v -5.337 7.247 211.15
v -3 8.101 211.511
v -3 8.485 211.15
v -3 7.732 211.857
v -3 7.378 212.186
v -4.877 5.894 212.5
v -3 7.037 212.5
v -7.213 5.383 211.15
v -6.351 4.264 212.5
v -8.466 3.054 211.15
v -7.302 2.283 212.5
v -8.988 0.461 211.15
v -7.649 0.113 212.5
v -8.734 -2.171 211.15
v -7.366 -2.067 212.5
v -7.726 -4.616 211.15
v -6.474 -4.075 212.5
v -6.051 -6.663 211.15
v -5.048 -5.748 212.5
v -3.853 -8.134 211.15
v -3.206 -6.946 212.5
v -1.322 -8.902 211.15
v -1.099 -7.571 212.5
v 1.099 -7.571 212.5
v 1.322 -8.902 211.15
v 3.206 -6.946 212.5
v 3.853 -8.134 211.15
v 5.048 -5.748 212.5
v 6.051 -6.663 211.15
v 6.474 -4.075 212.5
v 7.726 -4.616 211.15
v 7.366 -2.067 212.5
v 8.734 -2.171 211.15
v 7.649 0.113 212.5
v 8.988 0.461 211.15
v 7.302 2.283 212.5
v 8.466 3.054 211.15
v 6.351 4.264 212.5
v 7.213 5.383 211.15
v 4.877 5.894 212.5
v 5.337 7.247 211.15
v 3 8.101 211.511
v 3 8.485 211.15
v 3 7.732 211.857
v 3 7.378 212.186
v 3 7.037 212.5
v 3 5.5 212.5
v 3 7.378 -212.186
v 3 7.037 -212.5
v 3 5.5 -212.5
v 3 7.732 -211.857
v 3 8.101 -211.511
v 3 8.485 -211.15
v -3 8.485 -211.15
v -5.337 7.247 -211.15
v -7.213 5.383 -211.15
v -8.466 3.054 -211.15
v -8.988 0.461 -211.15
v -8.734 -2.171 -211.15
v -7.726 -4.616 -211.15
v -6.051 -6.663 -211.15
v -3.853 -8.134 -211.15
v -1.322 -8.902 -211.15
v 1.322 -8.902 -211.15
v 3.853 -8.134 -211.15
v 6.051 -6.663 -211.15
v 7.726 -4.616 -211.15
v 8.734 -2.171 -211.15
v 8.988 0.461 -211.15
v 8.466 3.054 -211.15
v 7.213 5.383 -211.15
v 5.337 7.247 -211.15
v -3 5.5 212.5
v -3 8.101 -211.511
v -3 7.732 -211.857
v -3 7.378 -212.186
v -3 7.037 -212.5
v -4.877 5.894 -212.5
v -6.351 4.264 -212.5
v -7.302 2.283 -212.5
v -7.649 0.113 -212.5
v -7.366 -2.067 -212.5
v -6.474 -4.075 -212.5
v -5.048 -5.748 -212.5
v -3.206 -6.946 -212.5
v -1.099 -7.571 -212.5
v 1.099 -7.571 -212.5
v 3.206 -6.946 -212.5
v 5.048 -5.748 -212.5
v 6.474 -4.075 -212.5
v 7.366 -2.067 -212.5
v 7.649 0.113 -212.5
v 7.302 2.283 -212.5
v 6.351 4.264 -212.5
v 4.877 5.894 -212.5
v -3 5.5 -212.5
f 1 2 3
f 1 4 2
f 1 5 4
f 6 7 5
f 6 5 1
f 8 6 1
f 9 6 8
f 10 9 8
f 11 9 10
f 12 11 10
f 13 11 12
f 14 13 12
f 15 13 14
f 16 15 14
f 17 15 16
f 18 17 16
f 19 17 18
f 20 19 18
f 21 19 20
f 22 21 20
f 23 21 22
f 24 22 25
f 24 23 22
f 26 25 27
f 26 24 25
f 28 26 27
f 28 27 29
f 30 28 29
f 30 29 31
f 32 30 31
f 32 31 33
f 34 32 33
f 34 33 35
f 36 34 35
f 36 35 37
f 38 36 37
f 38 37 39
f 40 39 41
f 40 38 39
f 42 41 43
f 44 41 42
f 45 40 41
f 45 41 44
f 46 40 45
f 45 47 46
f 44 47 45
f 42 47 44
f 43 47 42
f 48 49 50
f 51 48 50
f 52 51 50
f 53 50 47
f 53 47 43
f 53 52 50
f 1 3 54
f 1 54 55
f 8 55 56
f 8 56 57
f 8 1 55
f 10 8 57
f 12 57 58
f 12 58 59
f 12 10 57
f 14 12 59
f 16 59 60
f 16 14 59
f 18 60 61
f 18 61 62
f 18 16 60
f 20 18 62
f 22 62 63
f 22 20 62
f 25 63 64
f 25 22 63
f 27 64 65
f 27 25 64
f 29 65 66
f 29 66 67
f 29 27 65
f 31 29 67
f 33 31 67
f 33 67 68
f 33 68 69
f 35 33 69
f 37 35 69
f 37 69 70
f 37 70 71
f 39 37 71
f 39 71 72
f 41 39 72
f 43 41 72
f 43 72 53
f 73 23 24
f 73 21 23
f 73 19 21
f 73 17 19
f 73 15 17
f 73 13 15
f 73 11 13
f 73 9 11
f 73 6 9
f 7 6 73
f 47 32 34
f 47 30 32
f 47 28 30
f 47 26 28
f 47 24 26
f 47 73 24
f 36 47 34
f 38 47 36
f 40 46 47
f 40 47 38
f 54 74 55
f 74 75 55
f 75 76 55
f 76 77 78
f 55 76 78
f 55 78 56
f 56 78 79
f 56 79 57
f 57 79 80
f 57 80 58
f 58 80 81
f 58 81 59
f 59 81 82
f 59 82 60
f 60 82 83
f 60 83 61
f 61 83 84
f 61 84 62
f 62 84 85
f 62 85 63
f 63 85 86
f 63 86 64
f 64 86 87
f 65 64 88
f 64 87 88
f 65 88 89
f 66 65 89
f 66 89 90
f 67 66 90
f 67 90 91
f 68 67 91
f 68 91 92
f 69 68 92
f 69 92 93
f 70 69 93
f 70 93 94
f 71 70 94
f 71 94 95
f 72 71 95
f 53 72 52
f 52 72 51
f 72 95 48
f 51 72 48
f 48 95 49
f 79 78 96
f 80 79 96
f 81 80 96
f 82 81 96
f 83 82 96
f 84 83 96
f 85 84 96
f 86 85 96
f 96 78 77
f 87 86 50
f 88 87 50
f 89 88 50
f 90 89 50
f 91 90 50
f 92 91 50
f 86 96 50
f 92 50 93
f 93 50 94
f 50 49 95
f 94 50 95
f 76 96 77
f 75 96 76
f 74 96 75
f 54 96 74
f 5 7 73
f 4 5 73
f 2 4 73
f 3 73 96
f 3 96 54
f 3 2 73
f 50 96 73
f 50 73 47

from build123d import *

# Parameters (mm, degrees)
SKETCH1_R           = 9
EXTRUDE1_DEPTH      = 212.5
CHAMFER1_SIZE       = 1.35
SKETCH3_W           = 6
SKETCH3_H           = 3.5
EXTRUDE2_DEPTH      = 213.5
EXTRUDE2_DEPTH_BACK = 213.5


with BuildPart() as part:
    # Sketch1 → Extrude1 (new body, symmetric)
    with BuildSketch(Plane.XY):
        Circle(SKETCH1_R)
    extrude(amount=EXTRUDE1_DEPTH, both=True)

    # Chamfer1
    chamfer1_edges = [part.edges().sort_by_distance(p)[0] for p in [
        (-9, 0, -212.5),
        (-9, 0, 212.5),
    ]]
    chamfer(chamfer1_edges, length=CHAMFER1_SIZE)

    # Sketch3 → Extrude2 (cut, two sides)
    with BuildSketch(Plane.XY) as extrude2_sk:
        with Locations((0, 7.25)):
            Rectangle(SKETCH3_W, SKETCH3_H)
    extrude(amount=EXTRUDE2_DEPTH, mode=Mode.SUBTRACT)
    extrude(extrude2_sk.sketch, amount=-EXTRUDE2_DEPTH_BACK, mode=Mode.SUBTRACT)


solid = part.part
